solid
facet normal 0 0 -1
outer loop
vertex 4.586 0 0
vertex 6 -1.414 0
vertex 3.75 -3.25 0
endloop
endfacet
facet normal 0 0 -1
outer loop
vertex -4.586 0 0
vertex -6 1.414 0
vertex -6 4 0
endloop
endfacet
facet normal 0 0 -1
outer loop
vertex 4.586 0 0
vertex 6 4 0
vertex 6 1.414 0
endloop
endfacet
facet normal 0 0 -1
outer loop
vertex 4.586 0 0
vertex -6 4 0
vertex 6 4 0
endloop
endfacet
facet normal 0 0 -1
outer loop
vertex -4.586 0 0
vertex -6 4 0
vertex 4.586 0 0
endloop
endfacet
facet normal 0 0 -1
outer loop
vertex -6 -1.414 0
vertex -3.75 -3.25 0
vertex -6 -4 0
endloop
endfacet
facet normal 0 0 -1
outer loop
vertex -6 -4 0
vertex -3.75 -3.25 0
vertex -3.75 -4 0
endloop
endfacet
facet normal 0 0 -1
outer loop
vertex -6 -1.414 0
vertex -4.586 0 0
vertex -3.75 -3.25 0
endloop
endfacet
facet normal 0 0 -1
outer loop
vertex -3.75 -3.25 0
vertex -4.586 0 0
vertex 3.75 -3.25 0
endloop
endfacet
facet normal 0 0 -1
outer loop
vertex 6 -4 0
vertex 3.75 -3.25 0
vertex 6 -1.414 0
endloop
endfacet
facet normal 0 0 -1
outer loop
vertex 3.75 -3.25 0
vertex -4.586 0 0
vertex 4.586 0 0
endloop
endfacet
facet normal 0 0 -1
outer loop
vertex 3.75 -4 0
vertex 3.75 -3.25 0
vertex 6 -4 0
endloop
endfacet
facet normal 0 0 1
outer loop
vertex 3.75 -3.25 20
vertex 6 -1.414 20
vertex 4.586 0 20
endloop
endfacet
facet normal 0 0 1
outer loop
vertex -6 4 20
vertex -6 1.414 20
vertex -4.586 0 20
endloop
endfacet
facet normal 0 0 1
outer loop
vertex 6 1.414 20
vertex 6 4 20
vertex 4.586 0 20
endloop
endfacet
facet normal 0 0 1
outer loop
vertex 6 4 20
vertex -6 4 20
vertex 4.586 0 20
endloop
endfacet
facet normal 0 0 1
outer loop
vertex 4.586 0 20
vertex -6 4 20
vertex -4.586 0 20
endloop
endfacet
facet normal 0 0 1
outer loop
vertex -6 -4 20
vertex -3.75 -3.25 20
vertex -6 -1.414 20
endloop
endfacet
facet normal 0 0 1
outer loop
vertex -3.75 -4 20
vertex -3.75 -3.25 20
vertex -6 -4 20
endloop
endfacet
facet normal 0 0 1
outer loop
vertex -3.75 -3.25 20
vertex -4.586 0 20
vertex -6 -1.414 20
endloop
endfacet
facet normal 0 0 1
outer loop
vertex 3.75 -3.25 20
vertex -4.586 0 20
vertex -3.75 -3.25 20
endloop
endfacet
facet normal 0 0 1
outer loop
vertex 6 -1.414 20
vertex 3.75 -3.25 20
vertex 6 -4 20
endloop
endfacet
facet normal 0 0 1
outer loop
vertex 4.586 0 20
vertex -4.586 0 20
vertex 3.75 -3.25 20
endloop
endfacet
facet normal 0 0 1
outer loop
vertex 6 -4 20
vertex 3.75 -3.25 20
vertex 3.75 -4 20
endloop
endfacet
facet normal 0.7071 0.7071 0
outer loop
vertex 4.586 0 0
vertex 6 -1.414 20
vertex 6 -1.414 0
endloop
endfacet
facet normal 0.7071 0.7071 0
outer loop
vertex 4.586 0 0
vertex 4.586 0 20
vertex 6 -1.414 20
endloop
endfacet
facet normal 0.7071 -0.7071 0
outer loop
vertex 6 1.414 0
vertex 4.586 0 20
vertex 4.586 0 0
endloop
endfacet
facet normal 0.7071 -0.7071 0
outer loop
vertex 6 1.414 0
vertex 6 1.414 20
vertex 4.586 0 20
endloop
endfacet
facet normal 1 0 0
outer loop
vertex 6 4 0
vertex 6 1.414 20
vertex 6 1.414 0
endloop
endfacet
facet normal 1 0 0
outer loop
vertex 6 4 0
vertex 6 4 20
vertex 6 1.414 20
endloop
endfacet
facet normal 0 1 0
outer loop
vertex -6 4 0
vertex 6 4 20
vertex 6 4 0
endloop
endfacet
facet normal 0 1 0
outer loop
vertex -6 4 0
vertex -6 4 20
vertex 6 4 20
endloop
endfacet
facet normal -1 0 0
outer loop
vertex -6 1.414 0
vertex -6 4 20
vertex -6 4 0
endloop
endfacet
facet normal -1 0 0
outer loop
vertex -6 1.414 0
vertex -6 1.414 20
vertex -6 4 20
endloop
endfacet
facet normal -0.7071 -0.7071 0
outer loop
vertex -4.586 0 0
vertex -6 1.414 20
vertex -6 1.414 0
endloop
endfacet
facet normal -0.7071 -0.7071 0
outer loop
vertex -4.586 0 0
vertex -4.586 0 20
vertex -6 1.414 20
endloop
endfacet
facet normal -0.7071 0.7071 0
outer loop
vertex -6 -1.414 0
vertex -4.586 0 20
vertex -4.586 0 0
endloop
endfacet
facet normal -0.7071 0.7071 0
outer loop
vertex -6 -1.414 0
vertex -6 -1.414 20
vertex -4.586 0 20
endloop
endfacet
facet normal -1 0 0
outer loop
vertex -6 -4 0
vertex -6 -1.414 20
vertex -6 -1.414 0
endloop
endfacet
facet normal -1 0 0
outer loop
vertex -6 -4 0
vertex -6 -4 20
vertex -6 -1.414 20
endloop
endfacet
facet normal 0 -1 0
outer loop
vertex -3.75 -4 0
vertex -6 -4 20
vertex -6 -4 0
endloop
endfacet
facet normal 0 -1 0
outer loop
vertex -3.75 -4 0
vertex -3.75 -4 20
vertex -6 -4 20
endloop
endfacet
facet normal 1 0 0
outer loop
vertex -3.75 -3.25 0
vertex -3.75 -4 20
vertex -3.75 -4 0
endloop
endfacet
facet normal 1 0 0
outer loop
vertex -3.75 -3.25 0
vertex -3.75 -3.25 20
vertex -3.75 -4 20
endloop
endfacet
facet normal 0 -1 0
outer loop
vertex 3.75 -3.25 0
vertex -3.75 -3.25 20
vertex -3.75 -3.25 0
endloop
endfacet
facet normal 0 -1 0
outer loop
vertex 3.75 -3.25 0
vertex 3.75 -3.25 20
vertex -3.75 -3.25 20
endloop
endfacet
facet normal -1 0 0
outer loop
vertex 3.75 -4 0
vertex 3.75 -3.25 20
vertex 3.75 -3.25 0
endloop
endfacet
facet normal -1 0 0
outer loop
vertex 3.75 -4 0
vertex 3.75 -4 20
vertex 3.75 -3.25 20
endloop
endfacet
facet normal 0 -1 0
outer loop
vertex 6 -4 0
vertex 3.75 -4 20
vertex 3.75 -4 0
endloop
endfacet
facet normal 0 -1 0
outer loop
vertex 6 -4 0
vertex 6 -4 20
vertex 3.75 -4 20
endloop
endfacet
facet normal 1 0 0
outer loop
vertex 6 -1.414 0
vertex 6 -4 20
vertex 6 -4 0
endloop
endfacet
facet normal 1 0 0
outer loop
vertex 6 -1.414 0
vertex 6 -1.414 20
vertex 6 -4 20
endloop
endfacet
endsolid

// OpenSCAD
// MGN12 Rail Profile with Gothic Arch Cutout
linear_extrude(20) {
    difference() {
        // Main Rail Body (12mm wide, 8mm tall)
        // Centered for easier math
        square([12, 8], center = true);
        
        // Left Side Cutout
        translate([-6, 0])  // Move to left edge (4mm from bottom if centered)
            union() {
                rotate([0, 0, 45]) square([2, 2], center = true); // The V-groove
                circle(r = 0.8, $fn = 20); // The radius at the base of the groove
            }
            
        // Right Side Cutout
        translate([6, 0]) 
            union() {
                rotate([0, 0, 45]) square([2, 2], center = true);
                circle(r = 0.8, $fn = 20);
            }
            
        // Bottom Mounting Relief (Standard on most MGN12 rails)
        translate([0, -4]) 
            square([7.5, 1.5], center = true);
    }
}
